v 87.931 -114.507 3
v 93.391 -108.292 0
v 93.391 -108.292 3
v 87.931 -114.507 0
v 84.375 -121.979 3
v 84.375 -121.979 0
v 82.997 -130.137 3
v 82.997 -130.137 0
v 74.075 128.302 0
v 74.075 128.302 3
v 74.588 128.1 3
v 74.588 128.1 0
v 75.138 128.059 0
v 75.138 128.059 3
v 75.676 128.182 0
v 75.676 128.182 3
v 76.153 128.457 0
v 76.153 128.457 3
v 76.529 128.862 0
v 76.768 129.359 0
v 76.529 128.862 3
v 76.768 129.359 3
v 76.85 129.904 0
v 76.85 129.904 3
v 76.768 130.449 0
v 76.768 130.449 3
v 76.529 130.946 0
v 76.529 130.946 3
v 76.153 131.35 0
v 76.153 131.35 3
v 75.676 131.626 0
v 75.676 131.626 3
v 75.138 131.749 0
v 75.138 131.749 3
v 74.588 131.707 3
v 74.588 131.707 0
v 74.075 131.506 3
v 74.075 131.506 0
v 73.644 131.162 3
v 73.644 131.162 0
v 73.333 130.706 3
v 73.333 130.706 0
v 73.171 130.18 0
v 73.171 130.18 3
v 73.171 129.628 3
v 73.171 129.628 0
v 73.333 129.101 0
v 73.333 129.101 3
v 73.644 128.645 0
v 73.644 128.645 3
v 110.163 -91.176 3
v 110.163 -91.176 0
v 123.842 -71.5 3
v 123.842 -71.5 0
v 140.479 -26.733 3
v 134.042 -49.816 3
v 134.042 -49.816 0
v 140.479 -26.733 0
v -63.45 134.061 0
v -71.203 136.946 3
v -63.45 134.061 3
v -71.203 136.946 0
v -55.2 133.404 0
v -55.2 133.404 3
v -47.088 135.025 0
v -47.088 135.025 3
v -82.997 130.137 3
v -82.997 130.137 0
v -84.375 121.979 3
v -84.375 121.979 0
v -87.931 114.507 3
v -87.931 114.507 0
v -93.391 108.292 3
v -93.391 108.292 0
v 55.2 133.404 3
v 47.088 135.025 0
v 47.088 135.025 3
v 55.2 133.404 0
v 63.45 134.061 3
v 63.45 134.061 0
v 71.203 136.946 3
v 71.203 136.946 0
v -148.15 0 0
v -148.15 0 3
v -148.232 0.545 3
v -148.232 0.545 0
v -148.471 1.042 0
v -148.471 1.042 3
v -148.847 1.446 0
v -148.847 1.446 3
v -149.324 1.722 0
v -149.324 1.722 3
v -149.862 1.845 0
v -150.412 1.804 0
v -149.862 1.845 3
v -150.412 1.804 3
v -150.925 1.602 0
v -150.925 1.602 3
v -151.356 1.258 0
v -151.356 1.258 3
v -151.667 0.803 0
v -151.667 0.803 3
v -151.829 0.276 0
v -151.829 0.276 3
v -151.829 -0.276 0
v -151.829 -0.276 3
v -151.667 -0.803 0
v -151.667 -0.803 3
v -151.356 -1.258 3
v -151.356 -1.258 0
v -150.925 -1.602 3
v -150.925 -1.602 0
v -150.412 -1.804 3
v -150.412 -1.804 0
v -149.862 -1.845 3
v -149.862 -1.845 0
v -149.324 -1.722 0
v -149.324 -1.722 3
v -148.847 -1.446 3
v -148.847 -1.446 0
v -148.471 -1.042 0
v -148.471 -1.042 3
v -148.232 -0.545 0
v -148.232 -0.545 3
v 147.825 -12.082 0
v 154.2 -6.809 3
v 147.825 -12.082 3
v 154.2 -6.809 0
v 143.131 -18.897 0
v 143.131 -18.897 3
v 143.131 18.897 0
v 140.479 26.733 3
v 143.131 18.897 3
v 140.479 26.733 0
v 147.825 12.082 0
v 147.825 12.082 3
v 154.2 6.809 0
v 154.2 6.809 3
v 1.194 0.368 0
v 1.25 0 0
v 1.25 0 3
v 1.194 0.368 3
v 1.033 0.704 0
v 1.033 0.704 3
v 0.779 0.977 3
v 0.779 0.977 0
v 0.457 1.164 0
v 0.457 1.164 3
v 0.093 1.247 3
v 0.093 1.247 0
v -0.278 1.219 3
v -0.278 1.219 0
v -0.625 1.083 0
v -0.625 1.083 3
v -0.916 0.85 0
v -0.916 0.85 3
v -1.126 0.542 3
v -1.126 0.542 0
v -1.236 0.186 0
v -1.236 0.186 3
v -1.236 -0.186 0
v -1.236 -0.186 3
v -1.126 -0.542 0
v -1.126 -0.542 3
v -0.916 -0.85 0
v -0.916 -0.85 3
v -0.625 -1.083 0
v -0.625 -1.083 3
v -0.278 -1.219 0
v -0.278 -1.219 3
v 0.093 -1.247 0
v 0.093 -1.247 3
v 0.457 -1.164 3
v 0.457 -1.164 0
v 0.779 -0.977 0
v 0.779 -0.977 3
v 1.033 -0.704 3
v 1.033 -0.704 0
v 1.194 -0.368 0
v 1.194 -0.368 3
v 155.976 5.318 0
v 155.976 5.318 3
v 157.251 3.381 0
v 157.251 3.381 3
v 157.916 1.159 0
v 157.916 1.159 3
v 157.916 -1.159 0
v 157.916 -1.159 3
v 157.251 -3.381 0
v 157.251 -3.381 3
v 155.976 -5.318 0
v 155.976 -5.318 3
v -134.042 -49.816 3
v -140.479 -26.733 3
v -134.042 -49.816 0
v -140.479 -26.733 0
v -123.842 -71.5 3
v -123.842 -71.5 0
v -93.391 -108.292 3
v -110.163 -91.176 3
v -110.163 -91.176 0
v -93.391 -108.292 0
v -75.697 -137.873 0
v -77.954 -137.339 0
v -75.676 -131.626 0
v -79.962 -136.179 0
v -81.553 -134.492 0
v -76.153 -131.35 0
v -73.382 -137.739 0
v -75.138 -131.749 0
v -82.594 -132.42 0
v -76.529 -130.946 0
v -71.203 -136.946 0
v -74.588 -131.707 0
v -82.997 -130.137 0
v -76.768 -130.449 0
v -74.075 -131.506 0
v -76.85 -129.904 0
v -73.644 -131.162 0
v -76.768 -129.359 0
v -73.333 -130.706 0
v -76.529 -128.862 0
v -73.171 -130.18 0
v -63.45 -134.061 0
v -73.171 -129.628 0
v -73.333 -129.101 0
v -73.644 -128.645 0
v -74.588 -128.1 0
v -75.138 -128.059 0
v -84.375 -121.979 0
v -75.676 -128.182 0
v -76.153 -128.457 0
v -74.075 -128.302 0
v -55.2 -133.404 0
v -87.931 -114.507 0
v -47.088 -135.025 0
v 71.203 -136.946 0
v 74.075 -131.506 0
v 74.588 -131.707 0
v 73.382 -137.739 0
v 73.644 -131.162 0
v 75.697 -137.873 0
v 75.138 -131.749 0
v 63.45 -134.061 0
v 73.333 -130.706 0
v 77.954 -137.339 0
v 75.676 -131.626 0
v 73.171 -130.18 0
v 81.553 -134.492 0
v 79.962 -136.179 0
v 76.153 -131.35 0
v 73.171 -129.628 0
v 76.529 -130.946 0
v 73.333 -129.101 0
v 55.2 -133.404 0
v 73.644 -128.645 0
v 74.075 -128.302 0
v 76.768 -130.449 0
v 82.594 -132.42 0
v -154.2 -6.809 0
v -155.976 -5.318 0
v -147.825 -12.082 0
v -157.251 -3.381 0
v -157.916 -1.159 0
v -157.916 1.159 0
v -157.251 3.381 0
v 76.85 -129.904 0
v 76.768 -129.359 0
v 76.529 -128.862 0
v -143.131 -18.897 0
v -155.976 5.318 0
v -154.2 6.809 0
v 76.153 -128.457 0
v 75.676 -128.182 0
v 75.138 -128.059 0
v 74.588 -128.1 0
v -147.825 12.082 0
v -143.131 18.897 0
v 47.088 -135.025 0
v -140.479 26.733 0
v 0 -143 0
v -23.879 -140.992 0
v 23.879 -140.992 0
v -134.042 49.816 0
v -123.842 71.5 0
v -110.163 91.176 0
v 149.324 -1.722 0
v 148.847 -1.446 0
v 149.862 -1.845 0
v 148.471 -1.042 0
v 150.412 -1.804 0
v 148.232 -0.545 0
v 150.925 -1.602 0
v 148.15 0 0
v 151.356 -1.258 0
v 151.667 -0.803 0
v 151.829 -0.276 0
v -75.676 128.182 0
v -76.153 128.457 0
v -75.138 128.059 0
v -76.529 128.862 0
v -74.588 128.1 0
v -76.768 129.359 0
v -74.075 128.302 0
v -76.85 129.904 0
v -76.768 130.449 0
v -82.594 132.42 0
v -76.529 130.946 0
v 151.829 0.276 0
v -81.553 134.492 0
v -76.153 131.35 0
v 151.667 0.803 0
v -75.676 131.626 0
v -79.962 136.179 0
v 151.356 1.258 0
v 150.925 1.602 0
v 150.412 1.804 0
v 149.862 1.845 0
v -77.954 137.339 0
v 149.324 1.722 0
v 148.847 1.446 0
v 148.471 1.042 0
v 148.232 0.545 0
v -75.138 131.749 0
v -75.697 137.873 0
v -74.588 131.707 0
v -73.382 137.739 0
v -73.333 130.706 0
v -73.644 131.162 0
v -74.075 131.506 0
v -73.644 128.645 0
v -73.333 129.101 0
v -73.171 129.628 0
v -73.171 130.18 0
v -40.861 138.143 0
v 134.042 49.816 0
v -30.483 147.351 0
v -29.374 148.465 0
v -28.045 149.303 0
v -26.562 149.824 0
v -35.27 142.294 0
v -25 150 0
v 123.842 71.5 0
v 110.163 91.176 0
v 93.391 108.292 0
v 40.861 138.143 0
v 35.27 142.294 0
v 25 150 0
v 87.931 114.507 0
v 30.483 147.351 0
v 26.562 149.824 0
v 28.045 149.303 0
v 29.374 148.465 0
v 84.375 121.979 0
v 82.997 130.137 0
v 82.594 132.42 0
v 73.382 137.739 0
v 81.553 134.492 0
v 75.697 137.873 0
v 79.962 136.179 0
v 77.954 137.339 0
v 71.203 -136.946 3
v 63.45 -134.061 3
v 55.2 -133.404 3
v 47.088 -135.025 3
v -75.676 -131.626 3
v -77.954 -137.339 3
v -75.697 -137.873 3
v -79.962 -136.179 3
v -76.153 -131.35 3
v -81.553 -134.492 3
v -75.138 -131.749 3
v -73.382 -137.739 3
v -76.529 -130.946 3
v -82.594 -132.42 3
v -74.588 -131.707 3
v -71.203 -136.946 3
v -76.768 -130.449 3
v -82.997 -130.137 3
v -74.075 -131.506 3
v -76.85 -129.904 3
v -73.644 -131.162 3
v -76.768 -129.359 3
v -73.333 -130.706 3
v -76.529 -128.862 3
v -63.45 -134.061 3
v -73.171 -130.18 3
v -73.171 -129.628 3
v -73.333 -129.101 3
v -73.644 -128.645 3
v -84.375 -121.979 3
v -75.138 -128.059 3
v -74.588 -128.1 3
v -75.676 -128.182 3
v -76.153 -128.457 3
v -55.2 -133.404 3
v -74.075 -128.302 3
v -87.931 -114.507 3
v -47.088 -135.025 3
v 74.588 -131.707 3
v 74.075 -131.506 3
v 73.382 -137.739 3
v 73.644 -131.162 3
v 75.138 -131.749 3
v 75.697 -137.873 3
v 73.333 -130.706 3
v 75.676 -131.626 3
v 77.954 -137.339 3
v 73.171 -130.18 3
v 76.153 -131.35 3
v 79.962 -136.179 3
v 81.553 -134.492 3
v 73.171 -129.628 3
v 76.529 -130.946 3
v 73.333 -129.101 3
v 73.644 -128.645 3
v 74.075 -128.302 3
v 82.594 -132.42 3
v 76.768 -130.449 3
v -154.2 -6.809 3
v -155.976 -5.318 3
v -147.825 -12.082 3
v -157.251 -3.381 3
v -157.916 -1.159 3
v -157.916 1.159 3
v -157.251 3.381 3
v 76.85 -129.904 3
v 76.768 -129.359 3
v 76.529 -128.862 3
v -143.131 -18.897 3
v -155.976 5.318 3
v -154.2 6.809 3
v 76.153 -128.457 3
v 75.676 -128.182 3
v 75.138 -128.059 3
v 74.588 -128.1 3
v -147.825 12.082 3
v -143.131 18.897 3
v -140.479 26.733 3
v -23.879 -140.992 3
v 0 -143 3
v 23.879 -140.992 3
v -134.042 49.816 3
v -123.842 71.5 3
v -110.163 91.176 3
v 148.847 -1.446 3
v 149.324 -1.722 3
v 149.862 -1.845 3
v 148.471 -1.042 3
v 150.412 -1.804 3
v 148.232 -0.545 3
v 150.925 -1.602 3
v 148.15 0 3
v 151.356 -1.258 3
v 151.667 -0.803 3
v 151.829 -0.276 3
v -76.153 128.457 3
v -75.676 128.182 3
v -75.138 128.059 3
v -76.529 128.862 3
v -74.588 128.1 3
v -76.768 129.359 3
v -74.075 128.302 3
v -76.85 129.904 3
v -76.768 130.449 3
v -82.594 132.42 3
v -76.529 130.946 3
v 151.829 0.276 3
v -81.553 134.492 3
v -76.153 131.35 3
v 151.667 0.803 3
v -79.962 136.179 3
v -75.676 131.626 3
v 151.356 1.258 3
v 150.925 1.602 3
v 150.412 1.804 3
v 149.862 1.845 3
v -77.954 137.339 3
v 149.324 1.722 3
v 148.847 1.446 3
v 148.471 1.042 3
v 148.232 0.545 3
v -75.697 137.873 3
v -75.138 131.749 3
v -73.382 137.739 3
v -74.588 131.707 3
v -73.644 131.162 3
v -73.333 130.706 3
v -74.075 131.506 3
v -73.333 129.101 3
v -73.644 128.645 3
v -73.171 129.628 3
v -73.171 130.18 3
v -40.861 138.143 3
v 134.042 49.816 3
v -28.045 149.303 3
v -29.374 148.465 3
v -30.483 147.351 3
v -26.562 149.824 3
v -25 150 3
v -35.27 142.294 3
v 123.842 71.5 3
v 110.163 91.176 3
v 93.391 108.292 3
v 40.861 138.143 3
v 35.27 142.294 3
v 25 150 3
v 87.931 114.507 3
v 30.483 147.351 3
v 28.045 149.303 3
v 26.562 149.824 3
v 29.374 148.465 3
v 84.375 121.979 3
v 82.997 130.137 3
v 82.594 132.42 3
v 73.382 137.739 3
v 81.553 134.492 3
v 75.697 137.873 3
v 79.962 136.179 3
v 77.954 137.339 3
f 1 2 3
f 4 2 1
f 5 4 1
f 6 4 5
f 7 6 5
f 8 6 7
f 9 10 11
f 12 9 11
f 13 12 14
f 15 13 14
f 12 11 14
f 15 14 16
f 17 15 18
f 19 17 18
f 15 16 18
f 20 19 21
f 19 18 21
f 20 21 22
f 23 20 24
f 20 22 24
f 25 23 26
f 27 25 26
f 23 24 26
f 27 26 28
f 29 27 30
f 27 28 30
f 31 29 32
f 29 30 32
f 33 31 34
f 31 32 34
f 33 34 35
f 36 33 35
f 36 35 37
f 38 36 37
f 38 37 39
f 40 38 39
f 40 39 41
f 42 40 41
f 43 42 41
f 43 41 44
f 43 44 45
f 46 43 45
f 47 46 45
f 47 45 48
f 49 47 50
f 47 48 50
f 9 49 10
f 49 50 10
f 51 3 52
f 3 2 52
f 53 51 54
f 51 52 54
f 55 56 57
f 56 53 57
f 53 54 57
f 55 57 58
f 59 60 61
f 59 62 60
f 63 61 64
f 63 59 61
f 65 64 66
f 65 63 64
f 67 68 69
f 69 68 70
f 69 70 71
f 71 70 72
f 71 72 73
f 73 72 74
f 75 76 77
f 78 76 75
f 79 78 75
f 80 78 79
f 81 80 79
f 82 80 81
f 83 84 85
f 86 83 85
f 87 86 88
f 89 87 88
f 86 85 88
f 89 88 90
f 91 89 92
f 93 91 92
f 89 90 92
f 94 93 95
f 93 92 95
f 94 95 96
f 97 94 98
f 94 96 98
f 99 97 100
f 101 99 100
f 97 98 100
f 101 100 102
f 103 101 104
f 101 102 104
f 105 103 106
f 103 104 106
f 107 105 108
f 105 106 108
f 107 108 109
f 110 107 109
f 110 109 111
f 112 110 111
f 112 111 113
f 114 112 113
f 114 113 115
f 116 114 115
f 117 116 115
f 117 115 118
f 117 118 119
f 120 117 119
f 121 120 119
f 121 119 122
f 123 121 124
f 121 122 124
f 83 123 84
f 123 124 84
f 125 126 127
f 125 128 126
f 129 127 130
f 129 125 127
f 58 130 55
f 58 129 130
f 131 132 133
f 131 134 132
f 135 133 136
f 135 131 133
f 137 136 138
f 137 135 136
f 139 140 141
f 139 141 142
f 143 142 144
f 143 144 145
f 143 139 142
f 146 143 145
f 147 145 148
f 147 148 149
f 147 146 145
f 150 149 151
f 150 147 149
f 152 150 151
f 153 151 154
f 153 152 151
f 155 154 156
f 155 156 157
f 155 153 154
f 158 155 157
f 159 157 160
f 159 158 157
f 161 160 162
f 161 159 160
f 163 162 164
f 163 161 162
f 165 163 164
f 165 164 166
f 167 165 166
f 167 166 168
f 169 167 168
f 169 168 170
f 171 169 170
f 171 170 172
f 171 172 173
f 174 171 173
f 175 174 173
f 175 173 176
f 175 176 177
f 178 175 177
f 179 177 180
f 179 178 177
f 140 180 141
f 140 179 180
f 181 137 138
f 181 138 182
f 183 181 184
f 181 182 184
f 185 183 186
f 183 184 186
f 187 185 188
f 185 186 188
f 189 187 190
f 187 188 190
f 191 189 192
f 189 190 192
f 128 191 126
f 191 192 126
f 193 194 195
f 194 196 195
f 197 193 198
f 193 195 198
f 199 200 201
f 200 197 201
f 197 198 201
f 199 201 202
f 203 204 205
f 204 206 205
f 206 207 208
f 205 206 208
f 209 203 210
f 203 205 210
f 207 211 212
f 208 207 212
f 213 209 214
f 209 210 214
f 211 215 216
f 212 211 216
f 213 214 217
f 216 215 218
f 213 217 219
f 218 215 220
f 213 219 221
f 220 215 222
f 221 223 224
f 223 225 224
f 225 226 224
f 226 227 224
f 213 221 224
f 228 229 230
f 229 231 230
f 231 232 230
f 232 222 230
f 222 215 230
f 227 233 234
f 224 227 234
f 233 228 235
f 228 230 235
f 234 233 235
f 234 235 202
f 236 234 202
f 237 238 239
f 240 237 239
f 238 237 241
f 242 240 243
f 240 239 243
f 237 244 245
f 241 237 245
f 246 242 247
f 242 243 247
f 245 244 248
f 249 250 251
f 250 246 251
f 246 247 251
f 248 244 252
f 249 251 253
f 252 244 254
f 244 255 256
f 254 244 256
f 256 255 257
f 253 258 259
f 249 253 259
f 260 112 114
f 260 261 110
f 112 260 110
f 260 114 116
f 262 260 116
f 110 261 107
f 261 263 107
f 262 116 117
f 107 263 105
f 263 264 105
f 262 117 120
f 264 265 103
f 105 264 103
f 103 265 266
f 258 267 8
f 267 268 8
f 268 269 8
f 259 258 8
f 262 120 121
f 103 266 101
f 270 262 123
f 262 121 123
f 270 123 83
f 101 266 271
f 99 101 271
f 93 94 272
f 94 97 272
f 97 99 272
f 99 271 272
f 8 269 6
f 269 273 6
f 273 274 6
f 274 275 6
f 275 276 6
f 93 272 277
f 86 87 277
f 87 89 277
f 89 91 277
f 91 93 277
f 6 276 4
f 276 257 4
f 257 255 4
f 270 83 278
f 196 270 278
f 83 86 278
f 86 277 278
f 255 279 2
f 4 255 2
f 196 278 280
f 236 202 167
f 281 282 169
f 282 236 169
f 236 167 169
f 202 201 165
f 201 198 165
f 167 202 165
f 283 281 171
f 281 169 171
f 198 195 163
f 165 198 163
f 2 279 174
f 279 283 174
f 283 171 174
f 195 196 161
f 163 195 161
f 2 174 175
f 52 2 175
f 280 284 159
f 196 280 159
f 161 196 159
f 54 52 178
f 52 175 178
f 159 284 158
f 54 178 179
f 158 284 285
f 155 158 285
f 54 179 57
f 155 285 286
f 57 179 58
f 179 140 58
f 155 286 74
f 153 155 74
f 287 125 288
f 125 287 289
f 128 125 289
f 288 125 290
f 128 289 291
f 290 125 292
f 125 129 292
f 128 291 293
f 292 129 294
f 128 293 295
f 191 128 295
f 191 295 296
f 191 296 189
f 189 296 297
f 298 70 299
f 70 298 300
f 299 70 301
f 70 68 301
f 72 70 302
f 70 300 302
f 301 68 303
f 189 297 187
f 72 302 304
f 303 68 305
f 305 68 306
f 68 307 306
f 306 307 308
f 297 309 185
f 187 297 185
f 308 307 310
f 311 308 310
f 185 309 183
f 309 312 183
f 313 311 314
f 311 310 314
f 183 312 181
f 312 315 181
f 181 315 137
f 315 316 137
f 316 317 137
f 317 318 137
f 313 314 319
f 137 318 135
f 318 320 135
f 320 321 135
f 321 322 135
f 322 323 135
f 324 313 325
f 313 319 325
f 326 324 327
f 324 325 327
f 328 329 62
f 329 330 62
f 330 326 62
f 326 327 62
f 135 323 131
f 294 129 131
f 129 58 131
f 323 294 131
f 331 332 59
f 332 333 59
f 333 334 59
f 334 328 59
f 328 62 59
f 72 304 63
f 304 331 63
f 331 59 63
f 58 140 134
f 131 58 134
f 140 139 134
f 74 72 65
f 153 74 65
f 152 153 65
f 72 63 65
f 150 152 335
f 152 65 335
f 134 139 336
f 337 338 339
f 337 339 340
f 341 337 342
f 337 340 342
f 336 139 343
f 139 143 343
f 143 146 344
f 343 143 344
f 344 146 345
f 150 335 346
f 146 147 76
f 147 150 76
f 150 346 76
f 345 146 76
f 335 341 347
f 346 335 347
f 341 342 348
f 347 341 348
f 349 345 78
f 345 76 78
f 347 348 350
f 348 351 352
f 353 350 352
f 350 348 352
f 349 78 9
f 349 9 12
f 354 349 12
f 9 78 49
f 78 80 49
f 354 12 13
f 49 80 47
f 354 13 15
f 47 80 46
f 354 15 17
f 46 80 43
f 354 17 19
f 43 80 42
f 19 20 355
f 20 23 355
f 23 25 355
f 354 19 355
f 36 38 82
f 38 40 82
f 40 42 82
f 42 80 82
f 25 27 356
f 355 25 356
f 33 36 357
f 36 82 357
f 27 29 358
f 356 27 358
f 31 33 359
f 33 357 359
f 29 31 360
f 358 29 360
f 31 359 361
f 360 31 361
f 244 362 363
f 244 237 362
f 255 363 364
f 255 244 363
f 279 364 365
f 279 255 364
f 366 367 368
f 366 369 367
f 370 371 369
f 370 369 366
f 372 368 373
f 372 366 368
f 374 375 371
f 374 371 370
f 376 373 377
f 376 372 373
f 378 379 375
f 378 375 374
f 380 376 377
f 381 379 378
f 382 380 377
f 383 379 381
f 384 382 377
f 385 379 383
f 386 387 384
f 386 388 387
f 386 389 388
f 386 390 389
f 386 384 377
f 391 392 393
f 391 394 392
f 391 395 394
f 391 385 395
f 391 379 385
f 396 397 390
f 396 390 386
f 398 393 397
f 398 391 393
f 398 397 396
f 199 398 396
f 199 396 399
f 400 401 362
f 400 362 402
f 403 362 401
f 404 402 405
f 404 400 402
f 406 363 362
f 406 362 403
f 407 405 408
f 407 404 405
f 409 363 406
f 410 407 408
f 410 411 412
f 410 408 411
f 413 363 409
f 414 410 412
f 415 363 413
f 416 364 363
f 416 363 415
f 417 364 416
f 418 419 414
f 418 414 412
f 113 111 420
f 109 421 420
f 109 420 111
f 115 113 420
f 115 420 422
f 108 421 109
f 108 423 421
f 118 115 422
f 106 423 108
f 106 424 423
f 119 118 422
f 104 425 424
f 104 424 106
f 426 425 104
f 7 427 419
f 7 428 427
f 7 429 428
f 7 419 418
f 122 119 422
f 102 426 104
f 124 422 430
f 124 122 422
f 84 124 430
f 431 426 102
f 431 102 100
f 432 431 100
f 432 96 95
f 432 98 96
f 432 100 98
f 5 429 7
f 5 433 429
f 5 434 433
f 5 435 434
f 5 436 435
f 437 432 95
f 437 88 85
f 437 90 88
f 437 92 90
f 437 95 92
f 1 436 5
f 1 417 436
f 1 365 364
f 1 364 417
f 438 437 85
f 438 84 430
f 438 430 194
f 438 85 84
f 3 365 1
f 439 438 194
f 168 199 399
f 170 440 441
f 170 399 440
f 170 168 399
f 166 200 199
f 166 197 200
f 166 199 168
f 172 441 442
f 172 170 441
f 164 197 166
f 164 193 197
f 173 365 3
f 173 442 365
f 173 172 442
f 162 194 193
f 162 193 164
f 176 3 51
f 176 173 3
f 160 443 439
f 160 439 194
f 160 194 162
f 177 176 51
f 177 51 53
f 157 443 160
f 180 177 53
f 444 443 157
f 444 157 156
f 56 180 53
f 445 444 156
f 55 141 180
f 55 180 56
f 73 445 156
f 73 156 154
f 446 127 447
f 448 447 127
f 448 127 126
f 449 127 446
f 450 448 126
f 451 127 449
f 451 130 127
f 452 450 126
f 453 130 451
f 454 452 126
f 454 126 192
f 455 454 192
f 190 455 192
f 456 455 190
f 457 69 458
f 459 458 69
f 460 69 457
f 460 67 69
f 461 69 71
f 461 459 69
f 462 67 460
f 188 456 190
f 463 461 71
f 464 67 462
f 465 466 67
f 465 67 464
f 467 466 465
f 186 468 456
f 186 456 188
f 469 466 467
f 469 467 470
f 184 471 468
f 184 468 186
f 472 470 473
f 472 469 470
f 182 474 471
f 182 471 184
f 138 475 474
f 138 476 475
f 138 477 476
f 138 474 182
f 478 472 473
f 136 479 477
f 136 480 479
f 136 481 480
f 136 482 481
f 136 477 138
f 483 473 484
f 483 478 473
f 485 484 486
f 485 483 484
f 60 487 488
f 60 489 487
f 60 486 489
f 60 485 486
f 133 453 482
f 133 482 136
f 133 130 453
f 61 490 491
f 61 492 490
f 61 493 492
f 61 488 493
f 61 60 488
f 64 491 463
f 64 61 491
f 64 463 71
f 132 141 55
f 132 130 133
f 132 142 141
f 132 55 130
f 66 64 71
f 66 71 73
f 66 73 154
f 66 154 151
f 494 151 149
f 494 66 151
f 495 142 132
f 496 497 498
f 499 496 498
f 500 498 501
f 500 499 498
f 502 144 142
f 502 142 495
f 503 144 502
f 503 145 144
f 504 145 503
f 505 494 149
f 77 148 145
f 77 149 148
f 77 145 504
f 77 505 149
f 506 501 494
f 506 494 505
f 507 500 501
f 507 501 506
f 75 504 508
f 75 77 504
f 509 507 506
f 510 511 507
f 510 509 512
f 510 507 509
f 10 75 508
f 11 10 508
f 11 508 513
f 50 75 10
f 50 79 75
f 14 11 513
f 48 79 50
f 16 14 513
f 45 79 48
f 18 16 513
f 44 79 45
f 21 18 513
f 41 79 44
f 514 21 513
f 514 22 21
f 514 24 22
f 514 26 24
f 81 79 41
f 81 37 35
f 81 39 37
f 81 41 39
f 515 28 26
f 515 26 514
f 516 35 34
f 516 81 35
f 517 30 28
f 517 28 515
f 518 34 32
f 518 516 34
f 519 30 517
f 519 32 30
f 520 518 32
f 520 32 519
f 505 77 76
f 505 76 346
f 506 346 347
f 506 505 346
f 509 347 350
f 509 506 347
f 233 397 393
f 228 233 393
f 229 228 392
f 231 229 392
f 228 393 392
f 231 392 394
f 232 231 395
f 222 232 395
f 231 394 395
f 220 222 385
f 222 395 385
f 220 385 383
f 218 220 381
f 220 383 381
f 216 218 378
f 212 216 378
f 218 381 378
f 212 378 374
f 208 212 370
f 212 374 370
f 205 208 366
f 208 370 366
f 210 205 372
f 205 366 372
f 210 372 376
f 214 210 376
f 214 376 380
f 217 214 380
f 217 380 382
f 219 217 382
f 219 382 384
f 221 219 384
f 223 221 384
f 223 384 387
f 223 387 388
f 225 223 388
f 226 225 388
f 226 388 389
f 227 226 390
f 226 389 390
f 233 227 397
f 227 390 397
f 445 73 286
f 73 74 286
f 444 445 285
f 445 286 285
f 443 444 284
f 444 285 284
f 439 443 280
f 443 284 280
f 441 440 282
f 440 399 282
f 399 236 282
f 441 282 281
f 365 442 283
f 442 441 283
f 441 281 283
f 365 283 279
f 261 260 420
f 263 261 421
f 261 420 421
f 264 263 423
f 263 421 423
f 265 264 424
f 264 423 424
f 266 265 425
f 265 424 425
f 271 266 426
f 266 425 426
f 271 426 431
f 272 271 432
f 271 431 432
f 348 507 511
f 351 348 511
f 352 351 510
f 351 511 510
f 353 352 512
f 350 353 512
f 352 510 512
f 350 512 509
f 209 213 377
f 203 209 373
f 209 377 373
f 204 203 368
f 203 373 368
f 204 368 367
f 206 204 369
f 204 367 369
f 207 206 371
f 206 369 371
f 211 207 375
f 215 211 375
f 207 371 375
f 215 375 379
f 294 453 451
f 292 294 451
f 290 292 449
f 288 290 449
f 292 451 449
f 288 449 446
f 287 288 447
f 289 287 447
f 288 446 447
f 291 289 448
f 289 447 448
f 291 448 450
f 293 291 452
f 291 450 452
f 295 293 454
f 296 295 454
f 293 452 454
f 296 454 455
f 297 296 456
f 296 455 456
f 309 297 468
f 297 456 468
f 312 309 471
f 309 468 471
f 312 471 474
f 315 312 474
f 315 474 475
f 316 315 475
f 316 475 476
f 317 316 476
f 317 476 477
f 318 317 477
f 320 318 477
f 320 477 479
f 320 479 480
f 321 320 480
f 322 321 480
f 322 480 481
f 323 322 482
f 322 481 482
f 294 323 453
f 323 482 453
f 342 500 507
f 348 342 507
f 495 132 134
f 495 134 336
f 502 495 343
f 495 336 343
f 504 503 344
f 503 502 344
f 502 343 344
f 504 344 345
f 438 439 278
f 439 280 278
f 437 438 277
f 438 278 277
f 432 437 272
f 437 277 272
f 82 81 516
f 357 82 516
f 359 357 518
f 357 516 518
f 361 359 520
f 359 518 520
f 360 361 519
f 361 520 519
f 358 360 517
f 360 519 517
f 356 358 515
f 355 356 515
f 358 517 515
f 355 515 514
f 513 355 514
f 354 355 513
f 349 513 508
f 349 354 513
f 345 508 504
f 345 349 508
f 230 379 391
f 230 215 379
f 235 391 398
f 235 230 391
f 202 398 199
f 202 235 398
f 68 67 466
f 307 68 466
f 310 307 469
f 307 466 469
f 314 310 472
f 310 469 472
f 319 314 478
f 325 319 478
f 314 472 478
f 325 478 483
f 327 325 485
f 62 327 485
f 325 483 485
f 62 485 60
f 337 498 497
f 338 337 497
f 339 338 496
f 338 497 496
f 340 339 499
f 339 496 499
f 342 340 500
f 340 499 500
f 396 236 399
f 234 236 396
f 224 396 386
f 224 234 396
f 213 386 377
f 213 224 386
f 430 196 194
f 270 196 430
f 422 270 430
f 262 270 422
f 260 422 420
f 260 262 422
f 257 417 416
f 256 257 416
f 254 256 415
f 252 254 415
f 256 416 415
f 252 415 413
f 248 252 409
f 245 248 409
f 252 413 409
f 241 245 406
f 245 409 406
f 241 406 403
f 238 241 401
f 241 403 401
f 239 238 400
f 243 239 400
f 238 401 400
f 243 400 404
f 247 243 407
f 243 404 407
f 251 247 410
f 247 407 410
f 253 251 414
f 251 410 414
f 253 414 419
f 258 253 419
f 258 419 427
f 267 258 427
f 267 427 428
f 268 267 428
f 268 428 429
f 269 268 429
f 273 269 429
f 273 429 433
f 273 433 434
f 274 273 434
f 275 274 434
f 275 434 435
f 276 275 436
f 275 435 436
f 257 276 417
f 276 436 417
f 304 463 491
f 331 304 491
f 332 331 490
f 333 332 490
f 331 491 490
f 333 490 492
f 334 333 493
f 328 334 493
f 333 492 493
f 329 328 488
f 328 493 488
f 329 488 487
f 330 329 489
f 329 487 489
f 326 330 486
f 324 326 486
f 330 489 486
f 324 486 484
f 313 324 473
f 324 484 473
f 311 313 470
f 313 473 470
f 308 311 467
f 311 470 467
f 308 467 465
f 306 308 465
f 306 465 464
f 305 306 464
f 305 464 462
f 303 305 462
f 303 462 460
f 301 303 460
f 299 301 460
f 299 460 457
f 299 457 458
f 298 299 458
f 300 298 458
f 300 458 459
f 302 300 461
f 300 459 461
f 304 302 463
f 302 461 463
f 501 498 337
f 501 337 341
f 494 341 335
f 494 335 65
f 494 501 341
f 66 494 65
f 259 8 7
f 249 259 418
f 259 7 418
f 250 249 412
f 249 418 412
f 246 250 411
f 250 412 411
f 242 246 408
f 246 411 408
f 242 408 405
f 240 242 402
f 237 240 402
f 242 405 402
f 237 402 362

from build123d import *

# Parameters (mm, degrees)
SKETCH1_R                = 143
SKETCH1_R_2              = 1.25
BOSS_EXTRUDE1_DEPTH      = 3
SKETCH2_R                = 1.85
BOSS_EXTRUDE2_DEPTH      = 3
FILLET1_R                = 30
CIRPATTERN1_COUNT        = 6
FILLET1_OF_CIRPATTERN1_R = 30
BOSS_EXTRUDE4_DEPTH      = 3
FILLET2_R                = 40


with BuildPart() as part:
    # Sketch1 → Boss-Extrude1 (new body)
    with BuildSketch(Plane.XY):
        Circle(SKETCH1_R)
        Circle(SKETCH1_R_2, mode=Mode.SUBTRACT)
    extrude(amount=BOSS_EXTRUDE1_DEPTH)

    # Sketch2 → Boss-Extrude2 (add)
    with BuildSketch(Plane.XY.offset(3)):
        with BuildLine():
            Line((-136, -8), (-150, -8))
            ThreePointArc((-150, -8), (-158, 0), (-150, 8))
            Line((-150, 8), (-136, 8))
            ThreePointArc((-136, 8), (-128, 0), (-136, -8))
        make_face()
        with Locations((-150, 0)):
            Circle(SKETCH2_R, mode=Mode.SUBTRACT)
    boss_extrude2 = extrude(amount=-BOSS_EXTRUDE2_DEPTH)

    # Fillet1
    fillet1_edges = [part.edges().sort_by_distance(p)[0] for p in [
        (-142.776048411, 8, 1.5),
        (-142.776048411, -8, 1.5),
    ]]
    fillet(fillet1_edges, radius=FILLET1_R)

    # CirPattern1: Boss-Extrude2 ×6 about axis
    cirpattern1_axis = Axis((0, 0, 0), (0, 0, 1))
    for i in range(1, CIRPATTERN1_COUNT):
        add(boss_extrude2.rotate(cirpattern1_axis, i * 360 / CIRPATTERN1_COUNT))

    # Fillet1 of CirPattern1
    fillet1_of_cirpattern1_edges = [part.edges().sort_by_distance(p)[0] for p in [
        (-78.316227436, -119.647684976, 1.5),
        (-64.459820975, -127.647684976, 1.5),
        (64.459820975, -127.647684976, 1.5),
        (78.316227436, -119.647684976, 1.5),
        (142.776048411, -8, 1.5),
        (142.776048411, 8, 1.5),
        (78.316227436, 119.647684976, 1.5),
        (64.459820975, 127.647684976, 1.5),
        (-64.459820975, 127.647684976, 1.5),
        (-78.316227436, 119.647684976, 1.5),
    ]]
    fillet(fillet1_of_cirpattern1_edges, radius=FILLET1_OF_CIRPATTERN1_R)

    # Sketch6 → Boss-Extrude4 (add)
    with BuildSketch(Plane.XY.offset(3)):
        with BuildLine():
            Line((-25, 150), (25, 150))
            ThreePointArc((25, 150), (32, 143), (25, 136))
            Line((25, 136), (-25, 136))
            ThreePointArc((-25, 136), (-32, 143), (-25, 150))
        make_face()
    extrude(amount=-BOSS_EXTRUDE4_DEPTH)

    # Fillet2
    # the kernel refuses this fillet: 40 mm, written as the material it adds along each edge
    with BuildSketch(Plane(origin=(31.105412767, 139.575976789, 3), x_dir=(0.9617682057549536, -0.27386478123135344, 0), z_dir=(0, 0, -1))) as fillet2_piece_1:
        with BuildLine():
            CenterArc((20.599589027, -39.801292998), FILLET2_R, 95.71339394, 29.960885515)
            ThreePointArc((-2.727475038, -7.307476939), (-0.251629619, -4.068826545), (0, 0))
            ThreePointArc((0, 0), (8.308747323, -0.241586175), (16.617494645, 0))
        make_face()
    extrude(amount=3)
    with BuildSketch(Plane(origin=(-31.105412767, 139.575976789, 3), x_dir=(-0.9617682057549533, -0.27386478123135494, 0), z_dir=(0, 0, -1))) as fillet2_piece_2:
        with BuildLine():
            CenterArc((20.599589027, 39.801292998), FILLET2_R, 234.325720545, 29.960885515)
            ThreePointArc((-2.727475038, 7.307476939), (-0.251629619, 4.068826545), (0, 0))
            ThreePointArc((0, 0), (8.308747323, 0.241586175), (16.617494645, 0))
        make_face()
    extrude(amount=3)


solid = part.part
